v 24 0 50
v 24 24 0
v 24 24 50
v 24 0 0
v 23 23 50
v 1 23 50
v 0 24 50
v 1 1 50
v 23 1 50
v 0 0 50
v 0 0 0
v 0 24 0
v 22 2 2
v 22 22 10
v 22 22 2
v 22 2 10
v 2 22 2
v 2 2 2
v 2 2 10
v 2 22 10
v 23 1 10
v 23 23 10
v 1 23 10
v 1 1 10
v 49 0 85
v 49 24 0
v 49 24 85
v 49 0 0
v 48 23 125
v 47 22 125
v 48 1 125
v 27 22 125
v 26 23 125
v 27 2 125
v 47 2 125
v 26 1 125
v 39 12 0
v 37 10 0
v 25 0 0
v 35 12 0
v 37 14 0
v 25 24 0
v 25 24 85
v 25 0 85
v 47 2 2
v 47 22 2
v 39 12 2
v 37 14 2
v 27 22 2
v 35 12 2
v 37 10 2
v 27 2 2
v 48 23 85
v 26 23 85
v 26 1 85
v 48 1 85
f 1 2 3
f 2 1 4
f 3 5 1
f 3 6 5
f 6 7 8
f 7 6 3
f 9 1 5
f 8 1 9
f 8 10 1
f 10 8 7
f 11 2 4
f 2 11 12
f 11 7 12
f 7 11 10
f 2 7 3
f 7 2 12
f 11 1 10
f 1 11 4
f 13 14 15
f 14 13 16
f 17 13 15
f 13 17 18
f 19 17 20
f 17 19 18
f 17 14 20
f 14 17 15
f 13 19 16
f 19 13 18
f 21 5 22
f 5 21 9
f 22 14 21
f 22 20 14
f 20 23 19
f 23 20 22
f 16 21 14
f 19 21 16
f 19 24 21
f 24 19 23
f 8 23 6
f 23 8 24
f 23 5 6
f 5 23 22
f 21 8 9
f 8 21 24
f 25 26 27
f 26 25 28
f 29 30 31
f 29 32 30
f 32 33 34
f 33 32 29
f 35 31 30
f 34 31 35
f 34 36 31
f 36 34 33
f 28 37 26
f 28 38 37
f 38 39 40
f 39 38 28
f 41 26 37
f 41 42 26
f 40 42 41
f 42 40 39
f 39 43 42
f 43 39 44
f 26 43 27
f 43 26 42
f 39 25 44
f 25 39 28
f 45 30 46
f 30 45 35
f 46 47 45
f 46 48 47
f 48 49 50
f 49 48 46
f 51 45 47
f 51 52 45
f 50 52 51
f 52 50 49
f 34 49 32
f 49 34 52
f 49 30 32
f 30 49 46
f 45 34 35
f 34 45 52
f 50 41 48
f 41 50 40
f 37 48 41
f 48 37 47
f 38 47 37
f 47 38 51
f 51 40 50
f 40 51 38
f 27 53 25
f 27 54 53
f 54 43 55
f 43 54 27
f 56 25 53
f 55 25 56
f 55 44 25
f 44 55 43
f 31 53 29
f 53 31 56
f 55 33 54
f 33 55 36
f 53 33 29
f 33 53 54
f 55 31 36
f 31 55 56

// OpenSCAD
// Adjustable variables
$fn = 4;
// Target size for the occupying battery
totalHeight = 135;
// Target size for the occupying battery
insideRadius = 20;
// Shell thickness
shellThickness = 4;

// Calculated variables

// The outside thickness
outsideRadius = insideRadius + shellThickness;
// The radius of the cutout portion that makes the object hollow
capRadius = insideRadius + ( shellThickness / 2 );
// Distance of overlap between cap and body
cutoutDepth = 40;
// How much of the body do you want to be cap
capHeight = 50;
// Height of the body reliant on the cap height
bodyHeight = totalHeight - ( capHeight - cutoutDepth );
// depth of the cutout
cutoutHeight = bodyHeight - cutoutDepth;

module body() {
    difference() {
        
        difference() {
            // Main part of the body
            cube([ outsideRadius, outsideRadius, bodyHeight ]);
            // Cutout inside the main part of the body
            translate([ 2, 2, 2 ]) {
                cube([ insideRadius, insideRadius, bodyHeight ]);
            }
            // Air release cutout
            translate([ outsideRadius/2, outsideRadius/2, 0 ]){
                cylinder( shellThickness, shellThickness/2, shellThickness/2, true);
            }
        }
        // Cutout at the top
        translate([ 0, 0, cutoutHeight ]) { // Height of where the cutout starts
            difference() {
                cube([ outsideRadius, outsideRadius, cutoutDepth ]);
                translate([1,1,0]) {
                    cube([ capRadius, capRadius, cutoutDepth ]);
                }
            }
        }
    }
}

module cap() {
    difference() {
        // Main part of the cap
        cube([ outsideRadius, outsideRadius, capHeight ]);
        // Main cutout of the cap
        translate([ 2, 2, 2 ]) {
            cube([ insideRadius, insideRadius, 55 ]);
        }
        // Cutout at the top
        translate([ 1, 1, capHeight - cutoutDepth ]) { // height of where the cutout starts
            cube([ capRadius, capRadius, 55 ]);
        }
    }
}

cap();

translate([25,0,0]){
    body();
}



// 20mm by 125mm 
